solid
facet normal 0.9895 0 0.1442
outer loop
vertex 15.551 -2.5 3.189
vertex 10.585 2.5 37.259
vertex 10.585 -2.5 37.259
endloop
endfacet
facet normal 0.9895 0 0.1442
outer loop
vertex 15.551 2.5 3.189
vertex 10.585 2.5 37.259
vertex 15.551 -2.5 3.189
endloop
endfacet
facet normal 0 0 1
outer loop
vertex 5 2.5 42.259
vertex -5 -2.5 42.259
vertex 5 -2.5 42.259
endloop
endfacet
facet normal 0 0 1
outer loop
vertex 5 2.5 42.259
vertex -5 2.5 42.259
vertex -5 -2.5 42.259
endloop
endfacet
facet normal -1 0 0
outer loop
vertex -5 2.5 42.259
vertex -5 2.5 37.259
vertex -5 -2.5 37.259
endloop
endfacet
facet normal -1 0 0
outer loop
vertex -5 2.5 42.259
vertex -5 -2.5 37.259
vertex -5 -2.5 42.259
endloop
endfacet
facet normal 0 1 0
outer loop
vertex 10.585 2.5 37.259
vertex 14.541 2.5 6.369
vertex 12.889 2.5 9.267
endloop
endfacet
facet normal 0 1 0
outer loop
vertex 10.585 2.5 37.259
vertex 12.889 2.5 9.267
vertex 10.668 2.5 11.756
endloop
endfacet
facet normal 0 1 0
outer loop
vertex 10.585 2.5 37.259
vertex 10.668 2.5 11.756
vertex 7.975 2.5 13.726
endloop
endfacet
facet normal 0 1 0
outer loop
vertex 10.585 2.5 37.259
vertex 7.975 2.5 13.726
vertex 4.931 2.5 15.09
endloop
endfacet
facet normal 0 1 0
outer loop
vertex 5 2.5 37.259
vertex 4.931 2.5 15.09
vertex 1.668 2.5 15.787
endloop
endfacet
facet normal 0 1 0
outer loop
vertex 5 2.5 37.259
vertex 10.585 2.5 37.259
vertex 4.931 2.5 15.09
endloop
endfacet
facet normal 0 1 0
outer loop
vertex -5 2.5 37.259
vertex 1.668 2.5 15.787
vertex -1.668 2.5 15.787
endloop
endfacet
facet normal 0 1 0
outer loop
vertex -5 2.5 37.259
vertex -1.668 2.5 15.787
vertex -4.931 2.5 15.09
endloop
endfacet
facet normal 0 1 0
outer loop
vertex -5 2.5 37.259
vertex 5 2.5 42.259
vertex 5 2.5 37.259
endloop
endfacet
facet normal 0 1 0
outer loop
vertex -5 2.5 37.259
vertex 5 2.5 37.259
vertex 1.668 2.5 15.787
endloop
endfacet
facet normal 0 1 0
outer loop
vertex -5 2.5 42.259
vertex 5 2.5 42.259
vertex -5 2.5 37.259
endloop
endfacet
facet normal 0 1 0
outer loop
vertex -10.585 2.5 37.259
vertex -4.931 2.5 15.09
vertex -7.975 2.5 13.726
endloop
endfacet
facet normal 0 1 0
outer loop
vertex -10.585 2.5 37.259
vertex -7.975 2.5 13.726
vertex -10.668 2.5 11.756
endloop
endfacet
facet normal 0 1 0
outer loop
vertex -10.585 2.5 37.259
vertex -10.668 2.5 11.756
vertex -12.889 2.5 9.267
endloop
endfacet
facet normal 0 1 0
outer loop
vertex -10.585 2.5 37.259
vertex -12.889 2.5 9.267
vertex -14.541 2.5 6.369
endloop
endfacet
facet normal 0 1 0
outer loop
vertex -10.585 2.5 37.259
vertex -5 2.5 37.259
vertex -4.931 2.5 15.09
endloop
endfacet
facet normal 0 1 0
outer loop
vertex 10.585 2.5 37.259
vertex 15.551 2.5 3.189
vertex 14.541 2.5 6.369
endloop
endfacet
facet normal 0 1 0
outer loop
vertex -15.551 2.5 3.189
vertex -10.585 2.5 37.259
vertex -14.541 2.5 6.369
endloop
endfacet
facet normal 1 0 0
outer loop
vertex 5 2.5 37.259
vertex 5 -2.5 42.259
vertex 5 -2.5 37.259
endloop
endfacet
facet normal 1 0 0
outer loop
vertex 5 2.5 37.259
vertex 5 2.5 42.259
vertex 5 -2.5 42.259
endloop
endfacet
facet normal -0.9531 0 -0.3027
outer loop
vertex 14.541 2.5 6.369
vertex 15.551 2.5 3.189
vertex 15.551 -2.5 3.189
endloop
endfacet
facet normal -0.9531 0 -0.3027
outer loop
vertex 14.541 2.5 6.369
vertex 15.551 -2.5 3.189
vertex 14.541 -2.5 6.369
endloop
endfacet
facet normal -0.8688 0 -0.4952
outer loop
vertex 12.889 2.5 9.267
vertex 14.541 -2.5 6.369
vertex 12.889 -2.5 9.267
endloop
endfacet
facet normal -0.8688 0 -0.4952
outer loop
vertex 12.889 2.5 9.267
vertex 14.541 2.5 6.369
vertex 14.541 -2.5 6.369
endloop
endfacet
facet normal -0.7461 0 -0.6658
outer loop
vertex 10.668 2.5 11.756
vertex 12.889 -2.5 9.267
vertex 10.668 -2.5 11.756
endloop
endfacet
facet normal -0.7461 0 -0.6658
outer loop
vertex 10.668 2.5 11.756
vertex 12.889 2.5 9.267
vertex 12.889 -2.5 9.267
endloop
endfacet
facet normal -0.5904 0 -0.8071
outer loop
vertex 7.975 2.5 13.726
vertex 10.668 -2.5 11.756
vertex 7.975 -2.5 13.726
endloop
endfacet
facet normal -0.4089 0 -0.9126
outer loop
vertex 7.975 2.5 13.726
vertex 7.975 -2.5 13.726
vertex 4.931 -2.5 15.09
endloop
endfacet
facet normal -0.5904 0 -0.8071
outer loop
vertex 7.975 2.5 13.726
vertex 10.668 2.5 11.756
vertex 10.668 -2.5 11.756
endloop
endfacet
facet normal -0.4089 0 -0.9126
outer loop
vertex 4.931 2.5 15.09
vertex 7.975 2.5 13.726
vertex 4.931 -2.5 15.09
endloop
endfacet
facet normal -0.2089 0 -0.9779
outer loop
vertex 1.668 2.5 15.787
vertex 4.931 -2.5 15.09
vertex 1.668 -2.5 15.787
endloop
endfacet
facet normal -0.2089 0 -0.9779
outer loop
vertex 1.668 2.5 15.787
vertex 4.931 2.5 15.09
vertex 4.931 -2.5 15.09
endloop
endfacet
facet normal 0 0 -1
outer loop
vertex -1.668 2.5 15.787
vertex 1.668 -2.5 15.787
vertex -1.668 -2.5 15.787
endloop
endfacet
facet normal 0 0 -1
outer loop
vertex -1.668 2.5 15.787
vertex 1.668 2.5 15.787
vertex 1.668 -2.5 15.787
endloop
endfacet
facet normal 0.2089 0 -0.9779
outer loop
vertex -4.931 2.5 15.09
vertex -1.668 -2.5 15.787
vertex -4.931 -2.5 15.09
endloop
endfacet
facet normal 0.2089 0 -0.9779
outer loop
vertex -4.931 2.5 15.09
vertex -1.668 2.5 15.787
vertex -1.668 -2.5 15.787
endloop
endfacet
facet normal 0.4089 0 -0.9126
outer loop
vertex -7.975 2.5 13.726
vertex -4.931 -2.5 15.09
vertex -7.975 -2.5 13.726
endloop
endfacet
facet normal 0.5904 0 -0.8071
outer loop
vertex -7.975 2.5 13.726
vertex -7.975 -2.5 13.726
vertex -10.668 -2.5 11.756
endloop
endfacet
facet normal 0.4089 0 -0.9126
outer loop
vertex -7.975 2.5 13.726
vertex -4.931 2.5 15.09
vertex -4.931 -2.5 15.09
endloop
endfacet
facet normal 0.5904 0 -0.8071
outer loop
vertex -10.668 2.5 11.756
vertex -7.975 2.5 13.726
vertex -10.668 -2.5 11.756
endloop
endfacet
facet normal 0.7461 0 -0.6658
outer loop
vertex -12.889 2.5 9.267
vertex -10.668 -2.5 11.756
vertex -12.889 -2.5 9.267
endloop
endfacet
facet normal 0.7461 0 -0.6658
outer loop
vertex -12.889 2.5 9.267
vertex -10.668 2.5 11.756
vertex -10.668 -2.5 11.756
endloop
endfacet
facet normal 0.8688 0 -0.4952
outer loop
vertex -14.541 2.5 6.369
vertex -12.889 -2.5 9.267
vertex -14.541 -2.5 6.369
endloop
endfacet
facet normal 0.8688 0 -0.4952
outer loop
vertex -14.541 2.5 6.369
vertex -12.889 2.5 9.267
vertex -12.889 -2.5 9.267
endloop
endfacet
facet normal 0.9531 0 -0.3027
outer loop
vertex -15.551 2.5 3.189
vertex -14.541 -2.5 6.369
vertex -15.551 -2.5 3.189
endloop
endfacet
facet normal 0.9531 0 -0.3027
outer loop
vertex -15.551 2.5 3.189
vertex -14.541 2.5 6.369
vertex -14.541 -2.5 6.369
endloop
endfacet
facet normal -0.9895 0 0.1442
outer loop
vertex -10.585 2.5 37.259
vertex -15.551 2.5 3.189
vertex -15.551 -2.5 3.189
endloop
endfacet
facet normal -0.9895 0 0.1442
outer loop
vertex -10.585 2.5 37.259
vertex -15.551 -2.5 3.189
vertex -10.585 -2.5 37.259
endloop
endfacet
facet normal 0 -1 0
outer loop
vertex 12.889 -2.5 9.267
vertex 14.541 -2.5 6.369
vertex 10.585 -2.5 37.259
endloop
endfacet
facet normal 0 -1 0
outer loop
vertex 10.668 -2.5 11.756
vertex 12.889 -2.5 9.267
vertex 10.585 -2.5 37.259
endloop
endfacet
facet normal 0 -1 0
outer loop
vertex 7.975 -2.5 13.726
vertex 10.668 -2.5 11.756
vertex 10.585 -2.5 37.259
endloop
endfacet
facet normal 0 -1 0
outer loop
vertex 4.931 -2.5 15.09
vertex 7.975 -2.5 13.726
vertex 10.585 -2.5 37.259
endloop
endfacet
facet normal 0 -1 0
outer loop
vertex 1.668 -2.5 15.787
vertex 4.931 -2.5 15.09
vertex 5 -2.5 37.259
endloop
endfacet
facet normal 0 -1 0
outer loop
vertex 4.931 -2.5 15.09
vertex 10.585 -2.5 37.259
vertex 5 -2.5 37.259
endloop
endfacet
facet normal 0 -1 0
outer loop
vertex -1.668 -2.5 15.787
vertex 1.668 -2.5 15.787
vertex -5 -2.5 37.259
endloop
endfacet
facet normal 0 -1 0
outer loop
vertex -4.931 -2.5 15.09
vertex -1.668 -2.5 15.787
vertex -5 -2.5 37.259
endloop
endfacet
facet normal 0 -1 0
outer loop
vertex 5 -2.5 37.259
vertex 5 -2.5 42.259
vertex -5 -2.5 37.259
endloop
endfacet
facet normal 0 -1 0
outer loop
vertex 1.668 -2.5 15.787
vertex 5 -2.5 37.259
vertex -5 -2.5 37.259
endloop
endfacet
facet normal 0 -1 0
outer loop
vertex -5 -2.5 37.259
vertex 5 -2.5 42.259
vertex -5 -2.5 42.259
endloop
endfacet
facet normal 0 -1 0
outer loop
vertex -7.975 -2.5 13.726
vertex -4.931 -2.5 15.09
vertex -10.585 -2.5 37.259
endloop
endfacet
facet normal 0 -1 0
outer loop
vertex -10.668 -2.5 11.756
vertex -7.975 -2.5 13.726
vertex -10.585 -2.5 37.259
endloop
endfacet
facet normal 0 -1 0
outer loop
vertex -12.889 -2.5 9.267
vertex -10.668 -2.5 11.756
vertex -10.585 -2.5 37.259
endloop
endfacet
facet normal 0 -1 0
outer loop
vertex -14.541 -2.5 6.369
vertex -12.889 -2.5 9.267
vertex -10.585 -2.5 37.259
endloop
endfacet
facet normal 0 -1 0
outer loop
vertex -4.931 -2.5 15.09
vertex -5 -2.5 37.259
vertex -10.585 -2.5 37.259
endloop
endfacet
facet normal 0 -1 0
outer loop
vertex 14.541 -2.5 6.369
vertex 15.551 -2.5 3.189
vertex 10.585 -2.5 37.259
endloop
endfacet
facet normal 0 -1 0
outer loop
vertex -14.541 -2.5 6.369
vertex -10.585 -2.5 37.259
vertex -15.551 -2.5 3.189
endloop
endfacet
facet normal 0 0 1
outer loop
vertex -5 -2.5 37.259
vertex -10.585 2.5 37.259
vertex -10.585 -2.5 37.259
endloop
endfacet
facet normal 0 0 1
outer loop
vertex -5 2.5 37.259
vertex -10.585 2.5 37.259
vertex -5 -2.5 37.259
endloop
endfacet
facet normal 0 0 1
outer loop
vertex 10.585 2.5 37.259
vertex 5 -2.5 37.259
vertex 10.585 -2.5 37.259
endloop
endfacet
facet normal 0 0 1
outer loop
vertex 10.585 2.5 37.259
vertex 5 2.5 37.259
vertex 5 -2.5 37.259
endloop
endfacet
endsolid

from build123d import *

# Parameters (mm, degrees)
BOSS_EXTRUDE1_DEPTH = 2.5


with BuildPart() as part:
    # Sketch1 → Boss-Extrude1 (new, symmetric)
    with BuildSketch(Plane(origin=(0, 0, 0), x_dir=(-1, 0, 0), z_dir=(0, 1, 0))):
        with BuildLine():
            Line((-5, 37.258597416), (-10.584590832, 37.258597416))
            Line((-10.584590832, 37.258597416), (-15.551383484, 3.189058909))
            ThreePointArc((-15.551383484, 3.189058909), (0, 15.875), (15.551383484, 3.189058909))
            Line((15.551383484, 3.189058909), (10.584590832, 37.258597416))
            Line((10.584590832, 37.258597416), (5, 37.258597416))
            Line((5, 37.258597416), (5, 42.258597416))
            Line((5, 42.258597416), (-5, 42.258597416))
            Line((-5, 42.258597416), (-5, 37.258597416))
        make_face()
    extrude(amount=BOSS_EXTRUDE1_DEPTH, both=True)


solid = part.part
